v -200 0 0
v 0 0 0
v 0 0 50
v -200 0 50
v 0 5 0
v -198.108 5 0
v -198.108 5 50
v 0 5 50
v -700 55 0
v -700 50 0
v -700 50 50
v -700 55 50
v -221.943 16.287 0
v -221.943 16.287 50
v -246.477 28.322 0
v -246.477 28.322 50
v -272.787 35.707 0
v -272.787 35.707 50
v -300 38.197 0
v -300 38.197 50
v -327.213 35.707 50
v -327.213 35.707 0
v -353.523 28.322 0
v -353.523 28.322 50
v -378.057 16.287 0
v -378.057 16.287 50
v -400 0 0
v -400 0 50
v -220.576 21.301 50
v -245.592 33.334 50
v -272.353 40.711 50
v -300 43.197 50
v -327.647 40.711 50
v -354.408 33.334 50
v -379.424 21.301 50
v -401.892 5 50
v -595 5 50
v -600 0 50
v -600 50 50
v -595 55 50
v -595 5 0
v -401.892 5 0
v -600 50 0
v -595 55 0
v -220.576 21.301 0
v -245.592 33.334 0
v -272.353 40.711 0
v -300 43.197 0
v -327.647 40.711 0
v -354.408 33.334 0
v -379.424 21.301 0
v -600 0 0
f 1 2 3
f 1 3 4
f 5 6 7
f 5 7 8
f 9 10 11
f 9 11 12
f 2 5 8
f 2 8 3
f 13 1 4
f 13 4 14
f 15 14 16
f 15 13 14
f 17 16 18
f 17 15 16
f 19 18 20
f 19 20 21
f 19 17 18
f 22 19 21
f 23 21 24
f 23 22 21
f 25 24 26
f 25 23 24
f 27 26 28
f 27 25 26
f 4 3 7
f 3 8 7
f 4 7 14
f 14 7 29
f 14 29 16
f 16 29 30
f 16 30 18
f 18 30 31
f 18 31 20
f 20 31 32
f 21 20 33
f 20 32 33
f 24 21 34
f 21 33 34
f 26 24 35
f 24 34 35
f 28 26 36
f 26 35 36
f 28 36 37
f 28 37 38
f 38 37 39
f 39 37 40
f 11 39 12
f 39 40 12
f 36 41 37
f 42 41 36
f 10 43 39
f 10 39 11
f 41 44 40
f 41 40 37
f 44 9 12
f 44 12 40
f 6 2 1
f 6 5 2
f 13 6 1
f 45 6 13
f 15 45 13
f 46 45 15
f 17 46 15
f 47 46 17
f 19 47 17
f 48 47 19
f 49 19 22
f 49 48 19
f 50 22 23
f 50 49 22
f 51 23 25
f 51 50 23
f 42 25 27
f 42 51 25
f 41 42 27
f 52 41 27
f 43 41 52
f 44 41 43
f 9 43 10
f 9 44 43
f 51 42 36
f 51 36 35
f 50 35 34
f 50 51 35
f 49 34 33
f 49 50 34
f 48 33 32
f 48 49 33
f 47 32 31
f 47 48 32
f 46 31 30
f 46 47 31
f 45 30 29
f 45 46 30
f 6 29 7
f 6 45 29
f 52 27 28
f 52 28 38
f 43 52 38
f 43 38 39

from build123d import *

# Parameters (mm, degrees)
BOSS_EXTRUDE1_DEPTH = 50


with BuildPart() as part:
    # Sketch1 → Boss-Extrude1 (new body)
    with BuildSketch(Plane.XY):
        with BuildLine():
            Line((0, 0), (-200, 0))
            ThreePointArc((-200, 0), (-300, 38.196601125), (-400, 0))
            Line((-400, 0), (-600, 0))
            Line((-600, 0), (-600, 50))
            Line((-600, 50), (-700, 50))
            Line((-700, 50), (-700, 55))
            Line((-700, 55), (-595, 55))
            Line((-595, 55), (-595, 5))
            Line((-595, 5), (-401.891933004, 5))
            ThreePointArc((-401.891933004, 5), (-300, 43.196601125), (-198.108066996, 5))
            Line((-198.108066996, 5), (0, 5))
            Line((0, 5), (0, 0))
        make_face()
    extrude(amount=BOSS_EXTRUDE1_DEPTH)


solid = part.part
